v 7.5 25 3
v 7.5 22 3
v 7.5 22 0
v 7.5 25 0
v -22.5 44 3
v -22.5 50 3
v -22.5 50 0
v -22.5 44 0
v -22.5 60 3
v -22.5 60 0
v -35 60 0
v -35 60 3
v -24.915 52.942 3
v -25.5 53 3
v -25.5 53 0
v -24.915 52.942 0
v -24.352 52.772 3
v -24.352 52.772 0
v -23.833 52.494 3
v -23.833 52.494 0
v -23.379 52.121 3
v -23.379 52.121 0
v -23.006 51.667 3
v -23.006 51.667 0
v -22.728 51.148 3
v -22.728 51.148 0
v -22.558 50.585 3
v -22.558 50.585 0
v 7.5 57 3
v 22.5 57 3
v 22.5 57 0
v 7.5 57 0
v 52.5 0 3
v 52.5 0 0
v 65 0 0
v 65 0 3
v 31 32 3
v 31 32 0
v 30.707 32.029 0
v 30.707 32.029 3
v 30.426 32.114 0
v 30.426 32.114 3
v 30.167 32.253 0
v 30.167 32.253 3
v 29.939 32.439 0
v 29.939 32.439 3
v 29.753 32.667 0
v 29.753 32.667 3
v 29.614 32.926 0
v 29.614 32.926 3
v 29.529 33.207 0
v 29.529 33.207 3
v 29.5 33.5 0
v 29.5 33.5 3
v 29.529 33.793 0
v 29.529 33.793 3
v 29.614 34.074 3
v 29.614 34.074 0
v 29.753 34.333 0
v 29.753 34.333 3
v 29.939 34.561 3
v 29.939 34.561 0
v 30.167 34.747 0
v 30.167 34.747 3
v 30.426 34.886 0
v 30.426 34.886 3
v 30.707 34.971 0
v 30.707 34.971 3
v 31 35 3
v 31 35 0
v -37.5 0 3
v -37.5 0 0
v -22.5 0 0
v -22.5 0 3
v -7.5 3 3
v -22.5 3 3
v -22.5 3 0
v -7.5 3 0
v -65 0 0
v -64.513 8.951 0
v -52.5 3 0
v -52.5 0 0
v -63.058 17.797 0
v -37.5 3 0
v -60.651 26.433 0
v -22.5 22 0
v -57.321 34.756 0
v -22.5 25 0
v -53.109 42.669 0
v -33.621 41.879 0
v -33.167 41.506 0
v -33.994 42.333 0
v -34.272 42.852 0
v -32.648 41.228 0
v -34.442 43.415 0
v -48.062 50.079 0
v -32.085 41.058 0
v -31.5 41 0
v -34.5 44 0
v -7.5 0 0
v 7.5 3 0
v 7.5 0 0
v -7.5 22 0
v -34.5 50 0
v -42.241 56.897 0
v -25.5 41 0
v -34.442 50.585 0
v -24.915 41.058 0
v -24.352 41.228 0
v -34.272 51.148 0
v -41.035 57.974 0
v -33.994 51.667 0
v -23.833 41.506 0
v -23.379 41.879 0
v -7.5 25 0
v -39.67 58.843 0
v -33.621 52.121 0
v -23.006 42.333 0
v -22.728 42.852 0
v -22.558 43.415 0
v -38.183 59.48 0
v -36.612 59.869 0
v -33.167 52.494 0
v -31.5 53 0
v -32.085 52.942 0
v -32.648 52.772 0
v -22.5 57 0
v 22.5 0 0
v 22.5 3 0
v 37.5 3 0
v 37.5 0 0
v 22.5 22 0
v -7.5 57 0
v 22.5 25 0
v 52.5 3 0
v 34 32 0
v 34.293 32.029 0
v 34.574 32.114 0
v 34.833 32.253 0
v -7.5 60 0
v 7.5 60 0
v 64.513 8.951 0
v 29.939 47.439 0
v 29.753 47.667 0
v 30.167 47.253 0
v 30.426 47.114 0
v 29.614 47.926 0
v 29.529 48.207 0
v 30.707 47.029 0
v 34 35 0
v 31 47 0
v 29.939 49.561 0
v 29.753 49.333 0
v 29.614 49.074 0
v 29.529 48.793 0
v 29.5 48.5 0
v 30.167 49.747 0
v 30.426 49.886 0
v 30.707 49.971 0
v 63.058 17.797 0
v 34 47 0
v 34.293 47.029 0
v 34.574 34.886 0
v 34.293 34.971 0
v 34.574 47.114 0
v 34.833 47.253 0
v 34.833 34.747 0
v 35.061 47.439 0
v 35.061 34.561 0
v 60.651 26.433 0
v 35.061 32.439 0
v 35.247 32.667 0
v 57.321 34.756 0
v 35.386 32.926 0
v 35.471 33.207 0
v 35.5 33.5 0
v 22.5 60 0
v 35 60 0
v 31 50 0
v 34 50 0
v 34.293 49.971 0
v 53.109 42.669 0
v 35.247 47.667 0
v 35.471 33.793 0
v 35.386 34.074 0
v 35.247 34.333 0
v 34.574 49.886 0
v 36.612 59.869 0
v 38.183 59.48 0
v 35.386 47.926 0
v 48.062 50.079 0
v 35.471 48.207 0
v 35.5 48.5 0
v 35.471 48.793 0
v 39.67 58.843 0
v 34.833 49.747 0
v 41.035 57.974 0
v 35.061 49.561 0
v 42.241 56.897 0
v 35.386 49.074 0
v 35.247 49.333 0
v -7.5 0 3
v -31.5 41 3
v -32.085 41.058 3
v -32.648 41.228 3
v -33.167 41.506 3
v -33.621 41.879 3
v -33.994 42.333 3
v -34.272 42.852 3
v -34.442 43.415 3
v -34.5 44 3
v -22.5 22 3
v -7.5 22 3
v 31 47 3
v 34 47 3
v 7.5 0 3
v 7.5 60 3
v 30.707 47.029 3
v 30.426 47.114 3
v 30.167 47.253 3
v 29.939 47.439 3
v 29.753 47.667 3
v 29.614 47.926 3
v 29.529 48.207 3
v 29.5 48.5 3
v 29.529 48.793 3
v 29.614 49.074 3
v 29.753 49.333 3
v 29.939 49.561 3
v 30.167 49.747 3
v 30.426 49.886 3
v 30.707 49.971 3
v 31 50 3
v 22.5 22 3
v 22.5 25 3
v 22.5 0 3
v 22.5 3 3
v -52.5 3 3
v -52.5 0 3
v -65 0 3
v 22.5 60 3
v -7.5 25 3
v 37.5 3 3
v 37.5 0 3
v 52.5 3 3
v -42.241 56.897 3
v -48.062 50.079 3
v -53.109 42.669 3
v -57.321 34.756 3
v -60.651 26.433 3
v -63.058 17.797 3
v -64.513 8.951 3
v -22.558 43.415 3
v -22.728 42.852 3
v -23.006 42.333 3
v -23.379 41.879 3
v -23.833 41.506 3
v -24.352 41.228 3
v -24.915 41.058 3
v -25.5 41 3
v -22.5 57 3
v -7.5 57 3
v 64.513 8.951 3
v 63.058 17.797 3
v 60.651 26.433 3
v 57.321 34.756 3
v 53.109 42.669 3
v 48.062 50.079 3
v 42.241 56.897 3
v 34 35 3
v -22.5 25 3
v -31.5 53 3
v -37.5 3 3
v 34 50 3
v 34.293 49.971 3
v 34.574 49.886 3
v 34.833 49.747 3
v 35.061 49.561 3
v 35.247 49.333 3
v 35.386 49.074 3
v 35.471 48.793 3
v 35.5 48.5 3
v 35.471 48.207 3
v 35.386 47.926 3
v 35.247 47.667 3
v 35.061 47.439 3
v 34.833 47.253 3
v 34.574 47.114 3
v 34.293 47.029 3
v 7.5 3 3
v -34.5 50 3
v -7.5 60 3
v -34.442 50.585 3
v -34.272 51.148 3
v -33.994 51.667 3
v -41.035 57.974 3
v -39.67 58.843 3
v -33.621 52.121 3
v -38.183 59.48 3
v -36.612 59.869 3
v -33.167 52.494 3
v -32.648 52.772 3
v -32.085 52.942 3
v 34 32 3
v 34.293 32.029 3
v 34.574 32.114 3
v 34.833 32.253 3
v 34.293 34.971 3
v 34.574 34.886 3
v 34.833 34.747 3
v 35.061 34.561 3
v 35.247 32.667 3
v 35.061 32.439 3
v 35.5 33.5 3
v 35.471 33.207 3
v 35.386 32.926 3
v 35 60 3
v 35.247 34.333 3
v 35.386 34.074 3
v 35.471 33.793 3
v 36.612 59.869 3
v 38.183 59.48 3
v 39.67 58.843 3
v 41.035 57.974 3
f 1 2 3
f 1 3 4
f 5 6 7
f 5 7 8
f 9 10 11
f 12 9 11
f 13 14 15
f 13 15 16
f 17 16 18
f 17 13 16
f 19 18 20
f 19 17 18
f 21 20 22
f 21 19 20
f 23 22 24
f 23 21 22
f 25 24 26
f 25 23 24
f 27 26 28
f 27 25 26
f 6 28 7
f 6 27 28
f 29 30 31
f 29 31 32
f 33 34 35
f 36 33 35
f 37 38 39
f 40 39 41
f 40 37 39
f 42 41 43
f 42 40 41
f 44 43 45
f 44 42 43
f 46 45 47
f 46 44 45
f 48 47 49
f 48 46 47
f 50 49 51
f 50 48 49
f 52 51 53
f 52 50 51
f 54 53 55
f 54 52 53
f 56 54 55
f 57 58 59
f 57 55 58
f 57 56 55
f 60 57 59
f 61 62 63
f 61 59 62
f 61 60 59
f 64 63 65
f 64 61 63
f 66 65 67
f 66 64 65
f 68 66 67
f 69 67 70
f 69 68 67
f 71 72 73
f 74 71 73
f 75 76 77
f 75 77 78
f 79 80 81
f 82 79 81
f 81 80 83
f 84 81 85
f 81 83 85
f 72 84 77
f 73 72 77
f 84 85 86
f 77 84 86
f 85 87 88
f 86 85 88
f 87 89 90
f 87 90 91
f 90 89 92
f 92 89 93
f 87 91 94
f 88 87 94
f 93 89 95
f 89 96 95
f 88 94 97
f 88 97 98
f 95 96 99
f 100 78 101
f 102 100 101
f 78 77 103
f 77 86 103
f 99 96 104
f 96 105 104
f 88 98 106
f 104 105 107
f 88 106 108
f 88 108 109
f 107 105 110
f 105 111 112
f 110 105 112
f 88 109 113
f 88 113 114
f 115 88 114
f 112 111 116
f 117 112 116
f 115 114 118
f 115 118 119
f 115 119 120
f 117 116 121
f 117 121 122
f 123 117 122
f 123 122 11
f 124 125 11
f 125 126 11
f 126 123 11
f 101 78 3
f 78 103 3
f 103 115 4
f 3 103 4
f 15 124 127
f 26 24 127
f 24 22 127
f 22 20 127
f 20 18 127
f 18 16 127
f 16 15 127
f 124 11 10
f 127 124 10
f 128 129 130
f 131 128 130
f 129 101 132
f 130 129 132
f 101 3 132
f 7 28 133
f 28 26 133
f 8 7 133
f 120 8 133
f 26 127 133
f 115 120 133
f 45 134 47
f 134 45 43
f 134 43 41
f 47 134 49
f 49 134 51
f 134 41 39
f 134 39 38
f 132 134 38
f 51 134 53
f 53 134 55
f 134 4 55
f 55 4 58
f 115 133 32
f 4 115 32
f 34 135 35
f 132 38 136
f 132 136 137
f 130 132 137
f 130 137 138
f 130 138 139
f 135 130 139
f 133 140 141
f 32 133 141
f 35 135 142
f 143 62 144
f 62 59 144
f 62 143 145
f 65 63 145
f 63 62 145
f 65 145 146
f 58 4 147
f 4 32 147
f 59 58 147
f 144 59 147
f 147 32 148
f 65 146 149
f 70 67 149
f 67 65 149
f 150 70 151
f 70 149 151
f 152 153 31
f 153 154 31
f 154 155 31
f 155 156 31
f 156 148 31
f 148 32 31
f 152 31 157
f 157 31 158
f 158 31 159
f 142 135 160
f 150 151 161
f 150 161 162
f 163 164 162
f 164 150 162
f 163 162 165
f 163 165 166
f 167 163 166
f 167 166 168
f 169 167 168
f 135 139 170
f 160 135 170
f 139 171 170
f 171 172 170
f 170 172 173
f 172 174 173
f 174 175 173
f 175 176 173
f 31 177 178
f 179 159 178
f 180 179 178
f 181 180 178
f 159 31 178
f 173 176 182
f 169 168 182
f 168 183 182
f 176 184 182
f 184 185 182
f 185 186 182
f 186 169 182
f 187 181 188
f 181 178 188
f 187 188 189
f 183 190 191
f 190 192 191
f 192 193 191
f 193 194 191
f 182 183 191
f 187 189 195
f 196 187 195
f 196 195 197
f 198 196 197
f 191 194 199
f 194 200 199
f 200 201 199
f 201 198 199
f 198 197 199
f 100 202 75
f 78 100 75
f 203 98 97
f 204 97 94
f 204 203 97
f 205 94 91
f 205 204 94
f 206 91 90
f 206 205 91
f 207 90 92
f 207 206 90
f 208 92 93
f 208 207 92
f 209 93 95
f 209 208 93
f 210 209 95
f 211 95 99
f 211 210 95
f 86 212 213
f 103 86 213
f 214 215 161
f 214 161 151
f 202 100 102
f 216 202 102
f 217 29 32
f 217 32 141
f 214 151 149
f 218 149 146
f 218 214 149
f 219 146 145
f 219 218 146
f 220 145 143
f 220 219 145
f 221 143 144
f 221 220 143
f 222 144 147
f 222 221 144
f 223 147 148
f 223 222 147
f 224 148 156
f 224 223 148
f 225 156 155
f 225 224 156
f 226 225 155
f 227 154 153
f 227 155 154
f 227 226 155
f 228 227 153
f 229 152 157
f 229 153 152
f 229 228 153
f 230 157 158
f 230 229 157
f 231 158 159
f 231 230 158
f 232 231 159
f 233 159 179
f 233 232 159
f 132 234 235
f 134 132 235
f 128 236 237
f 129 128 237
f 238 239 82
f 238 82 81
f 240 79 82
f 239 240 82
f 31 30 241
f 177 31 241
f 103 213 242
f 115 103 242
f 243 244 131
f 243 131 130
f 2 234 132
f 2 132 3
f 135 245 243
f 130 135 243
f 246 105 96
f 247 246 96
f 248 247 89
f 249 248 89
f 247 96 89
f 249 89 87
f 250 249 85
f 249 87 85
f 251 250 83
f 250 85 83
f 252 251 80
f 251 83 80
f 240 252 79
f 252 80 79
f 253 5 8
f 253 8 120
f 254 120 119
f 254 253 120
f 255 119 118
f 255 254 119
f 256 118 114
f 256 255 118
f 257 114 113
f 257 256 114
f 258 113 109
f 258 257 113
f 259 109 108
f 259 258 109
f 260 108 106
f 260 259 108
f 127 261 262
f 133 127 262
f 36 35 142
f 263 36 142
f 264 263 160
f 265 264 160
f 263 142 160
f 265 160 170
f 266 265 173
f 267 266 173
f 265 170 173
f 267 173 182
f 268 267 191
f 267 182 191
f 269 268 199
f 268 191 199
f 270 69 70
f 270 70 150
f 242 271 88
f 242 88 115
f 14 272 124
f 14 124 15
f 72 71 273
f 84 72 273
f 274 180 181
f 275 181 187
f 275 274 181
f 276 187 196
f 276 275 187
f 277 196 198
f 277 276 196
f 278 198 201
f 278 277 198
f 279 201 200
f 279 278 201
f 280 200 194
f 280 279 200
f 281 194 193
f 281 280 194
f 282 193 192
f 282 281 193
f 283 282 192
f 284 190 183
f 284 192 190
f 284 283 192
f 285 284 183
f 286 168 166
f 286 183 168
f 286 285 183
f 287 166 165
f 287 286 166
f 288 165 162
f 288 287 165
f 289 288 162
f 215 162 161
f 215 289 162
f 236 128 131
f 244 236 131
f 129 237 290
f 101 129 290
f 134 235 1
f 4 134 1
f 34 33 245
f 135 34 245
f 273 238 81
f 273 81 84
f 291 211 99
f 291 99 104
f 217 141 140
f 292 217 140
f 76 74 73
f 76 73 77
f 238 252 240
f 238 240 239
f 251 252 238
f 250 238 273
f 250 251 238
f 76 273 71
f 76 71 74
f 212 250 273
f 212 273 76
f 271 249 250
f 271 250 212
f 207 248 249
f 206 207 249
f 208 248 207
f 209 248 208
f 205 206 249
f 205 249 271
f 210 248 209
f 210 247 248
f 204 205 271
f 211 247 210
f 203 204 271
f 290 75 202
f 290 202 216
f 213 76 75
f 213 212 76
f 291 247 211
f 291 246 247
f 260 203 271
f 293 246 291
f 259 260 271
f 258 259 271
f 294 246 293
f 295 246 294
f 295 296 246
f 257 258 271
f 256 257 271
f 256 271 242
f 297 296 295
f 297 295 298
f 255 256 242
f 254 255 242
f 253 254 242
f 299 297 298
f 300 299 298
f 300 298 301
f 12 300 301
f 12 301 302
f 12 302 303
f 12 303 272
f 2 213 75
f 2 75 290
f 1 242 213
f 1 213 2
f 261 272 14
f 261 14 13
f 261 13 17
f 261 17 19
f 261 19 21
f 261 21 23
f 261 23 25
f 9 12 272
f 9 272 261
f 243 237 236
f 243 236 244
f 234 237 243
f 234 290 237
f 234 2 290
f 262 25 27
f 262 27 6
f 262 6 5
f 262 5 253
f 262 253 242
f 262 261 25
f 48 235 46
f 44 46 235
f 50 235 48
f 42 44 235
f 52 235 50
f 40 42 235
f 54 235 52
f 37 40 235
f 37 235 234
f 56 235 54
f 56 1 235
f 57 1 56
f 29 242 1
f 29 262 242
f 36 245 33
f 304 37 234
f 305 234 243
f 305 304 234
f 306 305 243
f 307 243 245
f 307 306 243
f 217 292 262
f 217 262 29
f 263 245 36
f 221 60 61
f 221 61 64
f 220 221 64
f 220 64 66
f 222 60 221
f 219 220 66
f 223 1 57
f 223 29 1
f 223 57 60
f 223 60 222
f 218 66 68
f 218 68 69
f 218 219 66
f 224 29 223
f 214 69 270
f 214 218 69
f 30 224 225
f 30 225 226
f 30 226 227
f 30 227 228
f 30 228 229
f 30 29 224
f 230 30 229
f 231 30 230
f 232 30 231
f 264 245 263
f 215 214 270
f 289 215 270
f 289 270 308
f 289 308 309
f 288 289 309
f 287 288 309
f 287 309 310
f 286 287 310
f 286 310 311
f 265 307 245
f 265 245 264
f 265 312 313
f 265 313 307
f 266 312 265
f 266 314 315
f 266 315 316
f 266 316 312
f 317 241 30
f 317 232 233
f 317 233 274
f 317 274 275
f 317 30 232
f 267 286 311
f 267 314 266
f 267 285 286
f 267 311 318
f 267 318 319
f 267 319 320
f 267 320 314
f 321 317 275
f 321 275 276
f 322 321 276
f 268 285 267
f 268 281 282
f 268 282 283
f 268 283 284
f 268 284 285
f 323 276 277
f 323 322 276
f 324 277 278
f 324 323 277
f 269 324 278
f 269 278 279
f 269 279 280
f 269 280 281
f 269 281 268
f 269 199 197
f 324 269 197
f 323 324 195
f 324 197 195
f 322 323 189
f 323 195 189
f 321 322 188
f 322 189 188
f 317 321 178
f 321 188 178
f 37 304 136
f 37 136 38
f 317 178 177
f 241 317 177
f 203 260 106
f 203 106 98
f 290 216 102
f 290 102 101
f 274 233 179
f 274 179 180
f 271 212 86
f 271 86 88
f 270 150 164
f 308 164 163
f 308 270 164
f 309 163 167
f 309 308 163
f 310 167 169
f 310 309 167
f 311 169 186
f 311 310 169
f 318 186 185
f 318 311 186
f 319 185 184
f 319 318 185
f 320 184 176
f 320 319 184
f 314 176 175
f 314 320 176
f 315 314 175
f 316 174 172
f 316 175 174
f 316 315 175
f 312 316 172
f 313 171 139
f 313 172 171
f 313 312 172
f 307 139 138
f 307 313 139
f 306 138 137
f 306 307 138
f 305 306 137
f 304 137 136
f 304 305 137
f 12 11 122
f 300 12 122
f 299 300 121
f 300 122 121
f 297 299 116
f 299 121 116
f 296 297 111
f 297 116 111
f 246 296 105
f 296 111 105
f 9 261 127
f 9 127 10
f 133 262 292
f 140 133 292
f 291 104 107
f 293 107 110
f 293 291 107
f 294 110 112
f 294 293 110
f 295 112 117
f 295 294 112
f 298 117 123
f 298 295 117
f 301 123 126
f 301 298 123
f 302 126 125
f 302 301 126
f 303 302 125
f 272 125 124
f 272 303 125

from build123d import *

# Parameters (mm, degrees)
BOSS_EXTRUDE1_DEPTH = 3
SKETCH2_W           = 15
SKETCH2_H           = 3
CUT_EXTRUDE1_DEPTH  = 89.509886453
CUT_EXTRUDE2_DEPTH  = 89.509886453
CUT_EXTRUDE3_DEPTH  = 89.509886453


with BuildPart() as part:
    # Sketch1 → Boss-Extrude1 (new body)
    with BuildSketch(Plane.XY):
        with BuildLine():
            Line((35, 60), (-35, 60))
            ThreePointArc((-35, 60), (-38.939192986, 59.1914503), (-42.24137931, 56.896551724))
            ThreePointArc((-42.24137931, 56.896551724), (-59.099326998, 30.639730799), (-65, 0))
            Line((-65, 0), (65, 0))
            ThreePointArc((65, 0), (59.099326998, 30.639730799), (42.24137931, 56.896551724))
            ThreePointArc((42.24137931, 56.896551724), (38.939192986, 59.1914503), (35, 60))
        make_face()
    extrude(amount=BOSS_EXTRUDE1_DEPTH)

    # Sketch2 → Cut-Extrude1 (cut, through all)
    with BuildSketch(Plane.XY.offset(3)):
        with Locations((-15, 58.5)):
            Rectangle(SKETCH2_W, SKETCH2_H)
        with Locations((-45, 1.5)):
            Rectangle(SKETCH2_W, SKETCH2_H)
        with Locations((-15, 1.5)):
            Rectangle(SKETCH2_W, SKETCH2_H)
        with Locations((-15, 23.5)):
            Rectangle(SKETCH2_W, SKETCH2_H)
    cut_extrude1 = extrude(amount=-CUT_EXTRUDE1_DEPTH, mode=Mode.SUBTRACT)

    # Mirror1: Cut-Extrude1 across plane
    add(cut_extrude1.mirror(Plane(origin=(0, 0, 0), x_dir=(0, 0, 1), z_dir=(1, 0, 0))), mode=Mode.SUBTRACT)

    # Sketch3 → Cut-Extrude2 (cut, through all)
    with BuildSketch(Plane.XY.offset(3)):
        with BuildLine():
            Line((-31.5, 53), (-25.5, 53))
            ThreePointArc((-25.5, 53), (-23.378679656, 52.121320344), (-22.5, 50))
            Line((-22.5, 50), (-22.5, 44))
            ThreePointArc((-22.5, 44), (-23.378679656, 41.878679656), (-25.5, 41))
            Line((-25.5, 41), (-31.5, 41))
            ThreePointArc((-31.5, 41), (-33.621320344, 41.878679656), (-34.5, 44))
            Line((-34.5, 44), (-34.5, 50))
            ThreePointArc((-34.5, 50), (-33.621320344, 52.121320344), (-31.5, 53))
        make_face()
    extrude(amount=-CUT_EXTRUDE2_DEPTH, mode=Mode.SUBTRACT)

    # Sketch4 → Cut-Extrude3 (cut, through all)
    with BuildSketch(Plane.XY.offset(3)):
        with BuildLine():
            Line((31, 50), (34, 50))
            ThreePointArc((34, 50), (35.5, 48.5), (34, 47))
            Line((34, 47), (31, 47))
            ThreePointArc((31, 47), (29.5, 48.5), (31, 50))
        make_face()
        with BuildLine():
            Line((31, 35), (34, 35))
            ThreePointArc((34, 35), (35.5, 33.5), (34, 32))
            Line((34, 32), (31, 32))
            ThreePointArc((31, 32), (29.5, 33.5), (31, 35))
        make_face()
    extrude(amount=-CUT_EXTRUDE3_DEPTH, mode=Mode.SUBTRACT)


solid = part.part
